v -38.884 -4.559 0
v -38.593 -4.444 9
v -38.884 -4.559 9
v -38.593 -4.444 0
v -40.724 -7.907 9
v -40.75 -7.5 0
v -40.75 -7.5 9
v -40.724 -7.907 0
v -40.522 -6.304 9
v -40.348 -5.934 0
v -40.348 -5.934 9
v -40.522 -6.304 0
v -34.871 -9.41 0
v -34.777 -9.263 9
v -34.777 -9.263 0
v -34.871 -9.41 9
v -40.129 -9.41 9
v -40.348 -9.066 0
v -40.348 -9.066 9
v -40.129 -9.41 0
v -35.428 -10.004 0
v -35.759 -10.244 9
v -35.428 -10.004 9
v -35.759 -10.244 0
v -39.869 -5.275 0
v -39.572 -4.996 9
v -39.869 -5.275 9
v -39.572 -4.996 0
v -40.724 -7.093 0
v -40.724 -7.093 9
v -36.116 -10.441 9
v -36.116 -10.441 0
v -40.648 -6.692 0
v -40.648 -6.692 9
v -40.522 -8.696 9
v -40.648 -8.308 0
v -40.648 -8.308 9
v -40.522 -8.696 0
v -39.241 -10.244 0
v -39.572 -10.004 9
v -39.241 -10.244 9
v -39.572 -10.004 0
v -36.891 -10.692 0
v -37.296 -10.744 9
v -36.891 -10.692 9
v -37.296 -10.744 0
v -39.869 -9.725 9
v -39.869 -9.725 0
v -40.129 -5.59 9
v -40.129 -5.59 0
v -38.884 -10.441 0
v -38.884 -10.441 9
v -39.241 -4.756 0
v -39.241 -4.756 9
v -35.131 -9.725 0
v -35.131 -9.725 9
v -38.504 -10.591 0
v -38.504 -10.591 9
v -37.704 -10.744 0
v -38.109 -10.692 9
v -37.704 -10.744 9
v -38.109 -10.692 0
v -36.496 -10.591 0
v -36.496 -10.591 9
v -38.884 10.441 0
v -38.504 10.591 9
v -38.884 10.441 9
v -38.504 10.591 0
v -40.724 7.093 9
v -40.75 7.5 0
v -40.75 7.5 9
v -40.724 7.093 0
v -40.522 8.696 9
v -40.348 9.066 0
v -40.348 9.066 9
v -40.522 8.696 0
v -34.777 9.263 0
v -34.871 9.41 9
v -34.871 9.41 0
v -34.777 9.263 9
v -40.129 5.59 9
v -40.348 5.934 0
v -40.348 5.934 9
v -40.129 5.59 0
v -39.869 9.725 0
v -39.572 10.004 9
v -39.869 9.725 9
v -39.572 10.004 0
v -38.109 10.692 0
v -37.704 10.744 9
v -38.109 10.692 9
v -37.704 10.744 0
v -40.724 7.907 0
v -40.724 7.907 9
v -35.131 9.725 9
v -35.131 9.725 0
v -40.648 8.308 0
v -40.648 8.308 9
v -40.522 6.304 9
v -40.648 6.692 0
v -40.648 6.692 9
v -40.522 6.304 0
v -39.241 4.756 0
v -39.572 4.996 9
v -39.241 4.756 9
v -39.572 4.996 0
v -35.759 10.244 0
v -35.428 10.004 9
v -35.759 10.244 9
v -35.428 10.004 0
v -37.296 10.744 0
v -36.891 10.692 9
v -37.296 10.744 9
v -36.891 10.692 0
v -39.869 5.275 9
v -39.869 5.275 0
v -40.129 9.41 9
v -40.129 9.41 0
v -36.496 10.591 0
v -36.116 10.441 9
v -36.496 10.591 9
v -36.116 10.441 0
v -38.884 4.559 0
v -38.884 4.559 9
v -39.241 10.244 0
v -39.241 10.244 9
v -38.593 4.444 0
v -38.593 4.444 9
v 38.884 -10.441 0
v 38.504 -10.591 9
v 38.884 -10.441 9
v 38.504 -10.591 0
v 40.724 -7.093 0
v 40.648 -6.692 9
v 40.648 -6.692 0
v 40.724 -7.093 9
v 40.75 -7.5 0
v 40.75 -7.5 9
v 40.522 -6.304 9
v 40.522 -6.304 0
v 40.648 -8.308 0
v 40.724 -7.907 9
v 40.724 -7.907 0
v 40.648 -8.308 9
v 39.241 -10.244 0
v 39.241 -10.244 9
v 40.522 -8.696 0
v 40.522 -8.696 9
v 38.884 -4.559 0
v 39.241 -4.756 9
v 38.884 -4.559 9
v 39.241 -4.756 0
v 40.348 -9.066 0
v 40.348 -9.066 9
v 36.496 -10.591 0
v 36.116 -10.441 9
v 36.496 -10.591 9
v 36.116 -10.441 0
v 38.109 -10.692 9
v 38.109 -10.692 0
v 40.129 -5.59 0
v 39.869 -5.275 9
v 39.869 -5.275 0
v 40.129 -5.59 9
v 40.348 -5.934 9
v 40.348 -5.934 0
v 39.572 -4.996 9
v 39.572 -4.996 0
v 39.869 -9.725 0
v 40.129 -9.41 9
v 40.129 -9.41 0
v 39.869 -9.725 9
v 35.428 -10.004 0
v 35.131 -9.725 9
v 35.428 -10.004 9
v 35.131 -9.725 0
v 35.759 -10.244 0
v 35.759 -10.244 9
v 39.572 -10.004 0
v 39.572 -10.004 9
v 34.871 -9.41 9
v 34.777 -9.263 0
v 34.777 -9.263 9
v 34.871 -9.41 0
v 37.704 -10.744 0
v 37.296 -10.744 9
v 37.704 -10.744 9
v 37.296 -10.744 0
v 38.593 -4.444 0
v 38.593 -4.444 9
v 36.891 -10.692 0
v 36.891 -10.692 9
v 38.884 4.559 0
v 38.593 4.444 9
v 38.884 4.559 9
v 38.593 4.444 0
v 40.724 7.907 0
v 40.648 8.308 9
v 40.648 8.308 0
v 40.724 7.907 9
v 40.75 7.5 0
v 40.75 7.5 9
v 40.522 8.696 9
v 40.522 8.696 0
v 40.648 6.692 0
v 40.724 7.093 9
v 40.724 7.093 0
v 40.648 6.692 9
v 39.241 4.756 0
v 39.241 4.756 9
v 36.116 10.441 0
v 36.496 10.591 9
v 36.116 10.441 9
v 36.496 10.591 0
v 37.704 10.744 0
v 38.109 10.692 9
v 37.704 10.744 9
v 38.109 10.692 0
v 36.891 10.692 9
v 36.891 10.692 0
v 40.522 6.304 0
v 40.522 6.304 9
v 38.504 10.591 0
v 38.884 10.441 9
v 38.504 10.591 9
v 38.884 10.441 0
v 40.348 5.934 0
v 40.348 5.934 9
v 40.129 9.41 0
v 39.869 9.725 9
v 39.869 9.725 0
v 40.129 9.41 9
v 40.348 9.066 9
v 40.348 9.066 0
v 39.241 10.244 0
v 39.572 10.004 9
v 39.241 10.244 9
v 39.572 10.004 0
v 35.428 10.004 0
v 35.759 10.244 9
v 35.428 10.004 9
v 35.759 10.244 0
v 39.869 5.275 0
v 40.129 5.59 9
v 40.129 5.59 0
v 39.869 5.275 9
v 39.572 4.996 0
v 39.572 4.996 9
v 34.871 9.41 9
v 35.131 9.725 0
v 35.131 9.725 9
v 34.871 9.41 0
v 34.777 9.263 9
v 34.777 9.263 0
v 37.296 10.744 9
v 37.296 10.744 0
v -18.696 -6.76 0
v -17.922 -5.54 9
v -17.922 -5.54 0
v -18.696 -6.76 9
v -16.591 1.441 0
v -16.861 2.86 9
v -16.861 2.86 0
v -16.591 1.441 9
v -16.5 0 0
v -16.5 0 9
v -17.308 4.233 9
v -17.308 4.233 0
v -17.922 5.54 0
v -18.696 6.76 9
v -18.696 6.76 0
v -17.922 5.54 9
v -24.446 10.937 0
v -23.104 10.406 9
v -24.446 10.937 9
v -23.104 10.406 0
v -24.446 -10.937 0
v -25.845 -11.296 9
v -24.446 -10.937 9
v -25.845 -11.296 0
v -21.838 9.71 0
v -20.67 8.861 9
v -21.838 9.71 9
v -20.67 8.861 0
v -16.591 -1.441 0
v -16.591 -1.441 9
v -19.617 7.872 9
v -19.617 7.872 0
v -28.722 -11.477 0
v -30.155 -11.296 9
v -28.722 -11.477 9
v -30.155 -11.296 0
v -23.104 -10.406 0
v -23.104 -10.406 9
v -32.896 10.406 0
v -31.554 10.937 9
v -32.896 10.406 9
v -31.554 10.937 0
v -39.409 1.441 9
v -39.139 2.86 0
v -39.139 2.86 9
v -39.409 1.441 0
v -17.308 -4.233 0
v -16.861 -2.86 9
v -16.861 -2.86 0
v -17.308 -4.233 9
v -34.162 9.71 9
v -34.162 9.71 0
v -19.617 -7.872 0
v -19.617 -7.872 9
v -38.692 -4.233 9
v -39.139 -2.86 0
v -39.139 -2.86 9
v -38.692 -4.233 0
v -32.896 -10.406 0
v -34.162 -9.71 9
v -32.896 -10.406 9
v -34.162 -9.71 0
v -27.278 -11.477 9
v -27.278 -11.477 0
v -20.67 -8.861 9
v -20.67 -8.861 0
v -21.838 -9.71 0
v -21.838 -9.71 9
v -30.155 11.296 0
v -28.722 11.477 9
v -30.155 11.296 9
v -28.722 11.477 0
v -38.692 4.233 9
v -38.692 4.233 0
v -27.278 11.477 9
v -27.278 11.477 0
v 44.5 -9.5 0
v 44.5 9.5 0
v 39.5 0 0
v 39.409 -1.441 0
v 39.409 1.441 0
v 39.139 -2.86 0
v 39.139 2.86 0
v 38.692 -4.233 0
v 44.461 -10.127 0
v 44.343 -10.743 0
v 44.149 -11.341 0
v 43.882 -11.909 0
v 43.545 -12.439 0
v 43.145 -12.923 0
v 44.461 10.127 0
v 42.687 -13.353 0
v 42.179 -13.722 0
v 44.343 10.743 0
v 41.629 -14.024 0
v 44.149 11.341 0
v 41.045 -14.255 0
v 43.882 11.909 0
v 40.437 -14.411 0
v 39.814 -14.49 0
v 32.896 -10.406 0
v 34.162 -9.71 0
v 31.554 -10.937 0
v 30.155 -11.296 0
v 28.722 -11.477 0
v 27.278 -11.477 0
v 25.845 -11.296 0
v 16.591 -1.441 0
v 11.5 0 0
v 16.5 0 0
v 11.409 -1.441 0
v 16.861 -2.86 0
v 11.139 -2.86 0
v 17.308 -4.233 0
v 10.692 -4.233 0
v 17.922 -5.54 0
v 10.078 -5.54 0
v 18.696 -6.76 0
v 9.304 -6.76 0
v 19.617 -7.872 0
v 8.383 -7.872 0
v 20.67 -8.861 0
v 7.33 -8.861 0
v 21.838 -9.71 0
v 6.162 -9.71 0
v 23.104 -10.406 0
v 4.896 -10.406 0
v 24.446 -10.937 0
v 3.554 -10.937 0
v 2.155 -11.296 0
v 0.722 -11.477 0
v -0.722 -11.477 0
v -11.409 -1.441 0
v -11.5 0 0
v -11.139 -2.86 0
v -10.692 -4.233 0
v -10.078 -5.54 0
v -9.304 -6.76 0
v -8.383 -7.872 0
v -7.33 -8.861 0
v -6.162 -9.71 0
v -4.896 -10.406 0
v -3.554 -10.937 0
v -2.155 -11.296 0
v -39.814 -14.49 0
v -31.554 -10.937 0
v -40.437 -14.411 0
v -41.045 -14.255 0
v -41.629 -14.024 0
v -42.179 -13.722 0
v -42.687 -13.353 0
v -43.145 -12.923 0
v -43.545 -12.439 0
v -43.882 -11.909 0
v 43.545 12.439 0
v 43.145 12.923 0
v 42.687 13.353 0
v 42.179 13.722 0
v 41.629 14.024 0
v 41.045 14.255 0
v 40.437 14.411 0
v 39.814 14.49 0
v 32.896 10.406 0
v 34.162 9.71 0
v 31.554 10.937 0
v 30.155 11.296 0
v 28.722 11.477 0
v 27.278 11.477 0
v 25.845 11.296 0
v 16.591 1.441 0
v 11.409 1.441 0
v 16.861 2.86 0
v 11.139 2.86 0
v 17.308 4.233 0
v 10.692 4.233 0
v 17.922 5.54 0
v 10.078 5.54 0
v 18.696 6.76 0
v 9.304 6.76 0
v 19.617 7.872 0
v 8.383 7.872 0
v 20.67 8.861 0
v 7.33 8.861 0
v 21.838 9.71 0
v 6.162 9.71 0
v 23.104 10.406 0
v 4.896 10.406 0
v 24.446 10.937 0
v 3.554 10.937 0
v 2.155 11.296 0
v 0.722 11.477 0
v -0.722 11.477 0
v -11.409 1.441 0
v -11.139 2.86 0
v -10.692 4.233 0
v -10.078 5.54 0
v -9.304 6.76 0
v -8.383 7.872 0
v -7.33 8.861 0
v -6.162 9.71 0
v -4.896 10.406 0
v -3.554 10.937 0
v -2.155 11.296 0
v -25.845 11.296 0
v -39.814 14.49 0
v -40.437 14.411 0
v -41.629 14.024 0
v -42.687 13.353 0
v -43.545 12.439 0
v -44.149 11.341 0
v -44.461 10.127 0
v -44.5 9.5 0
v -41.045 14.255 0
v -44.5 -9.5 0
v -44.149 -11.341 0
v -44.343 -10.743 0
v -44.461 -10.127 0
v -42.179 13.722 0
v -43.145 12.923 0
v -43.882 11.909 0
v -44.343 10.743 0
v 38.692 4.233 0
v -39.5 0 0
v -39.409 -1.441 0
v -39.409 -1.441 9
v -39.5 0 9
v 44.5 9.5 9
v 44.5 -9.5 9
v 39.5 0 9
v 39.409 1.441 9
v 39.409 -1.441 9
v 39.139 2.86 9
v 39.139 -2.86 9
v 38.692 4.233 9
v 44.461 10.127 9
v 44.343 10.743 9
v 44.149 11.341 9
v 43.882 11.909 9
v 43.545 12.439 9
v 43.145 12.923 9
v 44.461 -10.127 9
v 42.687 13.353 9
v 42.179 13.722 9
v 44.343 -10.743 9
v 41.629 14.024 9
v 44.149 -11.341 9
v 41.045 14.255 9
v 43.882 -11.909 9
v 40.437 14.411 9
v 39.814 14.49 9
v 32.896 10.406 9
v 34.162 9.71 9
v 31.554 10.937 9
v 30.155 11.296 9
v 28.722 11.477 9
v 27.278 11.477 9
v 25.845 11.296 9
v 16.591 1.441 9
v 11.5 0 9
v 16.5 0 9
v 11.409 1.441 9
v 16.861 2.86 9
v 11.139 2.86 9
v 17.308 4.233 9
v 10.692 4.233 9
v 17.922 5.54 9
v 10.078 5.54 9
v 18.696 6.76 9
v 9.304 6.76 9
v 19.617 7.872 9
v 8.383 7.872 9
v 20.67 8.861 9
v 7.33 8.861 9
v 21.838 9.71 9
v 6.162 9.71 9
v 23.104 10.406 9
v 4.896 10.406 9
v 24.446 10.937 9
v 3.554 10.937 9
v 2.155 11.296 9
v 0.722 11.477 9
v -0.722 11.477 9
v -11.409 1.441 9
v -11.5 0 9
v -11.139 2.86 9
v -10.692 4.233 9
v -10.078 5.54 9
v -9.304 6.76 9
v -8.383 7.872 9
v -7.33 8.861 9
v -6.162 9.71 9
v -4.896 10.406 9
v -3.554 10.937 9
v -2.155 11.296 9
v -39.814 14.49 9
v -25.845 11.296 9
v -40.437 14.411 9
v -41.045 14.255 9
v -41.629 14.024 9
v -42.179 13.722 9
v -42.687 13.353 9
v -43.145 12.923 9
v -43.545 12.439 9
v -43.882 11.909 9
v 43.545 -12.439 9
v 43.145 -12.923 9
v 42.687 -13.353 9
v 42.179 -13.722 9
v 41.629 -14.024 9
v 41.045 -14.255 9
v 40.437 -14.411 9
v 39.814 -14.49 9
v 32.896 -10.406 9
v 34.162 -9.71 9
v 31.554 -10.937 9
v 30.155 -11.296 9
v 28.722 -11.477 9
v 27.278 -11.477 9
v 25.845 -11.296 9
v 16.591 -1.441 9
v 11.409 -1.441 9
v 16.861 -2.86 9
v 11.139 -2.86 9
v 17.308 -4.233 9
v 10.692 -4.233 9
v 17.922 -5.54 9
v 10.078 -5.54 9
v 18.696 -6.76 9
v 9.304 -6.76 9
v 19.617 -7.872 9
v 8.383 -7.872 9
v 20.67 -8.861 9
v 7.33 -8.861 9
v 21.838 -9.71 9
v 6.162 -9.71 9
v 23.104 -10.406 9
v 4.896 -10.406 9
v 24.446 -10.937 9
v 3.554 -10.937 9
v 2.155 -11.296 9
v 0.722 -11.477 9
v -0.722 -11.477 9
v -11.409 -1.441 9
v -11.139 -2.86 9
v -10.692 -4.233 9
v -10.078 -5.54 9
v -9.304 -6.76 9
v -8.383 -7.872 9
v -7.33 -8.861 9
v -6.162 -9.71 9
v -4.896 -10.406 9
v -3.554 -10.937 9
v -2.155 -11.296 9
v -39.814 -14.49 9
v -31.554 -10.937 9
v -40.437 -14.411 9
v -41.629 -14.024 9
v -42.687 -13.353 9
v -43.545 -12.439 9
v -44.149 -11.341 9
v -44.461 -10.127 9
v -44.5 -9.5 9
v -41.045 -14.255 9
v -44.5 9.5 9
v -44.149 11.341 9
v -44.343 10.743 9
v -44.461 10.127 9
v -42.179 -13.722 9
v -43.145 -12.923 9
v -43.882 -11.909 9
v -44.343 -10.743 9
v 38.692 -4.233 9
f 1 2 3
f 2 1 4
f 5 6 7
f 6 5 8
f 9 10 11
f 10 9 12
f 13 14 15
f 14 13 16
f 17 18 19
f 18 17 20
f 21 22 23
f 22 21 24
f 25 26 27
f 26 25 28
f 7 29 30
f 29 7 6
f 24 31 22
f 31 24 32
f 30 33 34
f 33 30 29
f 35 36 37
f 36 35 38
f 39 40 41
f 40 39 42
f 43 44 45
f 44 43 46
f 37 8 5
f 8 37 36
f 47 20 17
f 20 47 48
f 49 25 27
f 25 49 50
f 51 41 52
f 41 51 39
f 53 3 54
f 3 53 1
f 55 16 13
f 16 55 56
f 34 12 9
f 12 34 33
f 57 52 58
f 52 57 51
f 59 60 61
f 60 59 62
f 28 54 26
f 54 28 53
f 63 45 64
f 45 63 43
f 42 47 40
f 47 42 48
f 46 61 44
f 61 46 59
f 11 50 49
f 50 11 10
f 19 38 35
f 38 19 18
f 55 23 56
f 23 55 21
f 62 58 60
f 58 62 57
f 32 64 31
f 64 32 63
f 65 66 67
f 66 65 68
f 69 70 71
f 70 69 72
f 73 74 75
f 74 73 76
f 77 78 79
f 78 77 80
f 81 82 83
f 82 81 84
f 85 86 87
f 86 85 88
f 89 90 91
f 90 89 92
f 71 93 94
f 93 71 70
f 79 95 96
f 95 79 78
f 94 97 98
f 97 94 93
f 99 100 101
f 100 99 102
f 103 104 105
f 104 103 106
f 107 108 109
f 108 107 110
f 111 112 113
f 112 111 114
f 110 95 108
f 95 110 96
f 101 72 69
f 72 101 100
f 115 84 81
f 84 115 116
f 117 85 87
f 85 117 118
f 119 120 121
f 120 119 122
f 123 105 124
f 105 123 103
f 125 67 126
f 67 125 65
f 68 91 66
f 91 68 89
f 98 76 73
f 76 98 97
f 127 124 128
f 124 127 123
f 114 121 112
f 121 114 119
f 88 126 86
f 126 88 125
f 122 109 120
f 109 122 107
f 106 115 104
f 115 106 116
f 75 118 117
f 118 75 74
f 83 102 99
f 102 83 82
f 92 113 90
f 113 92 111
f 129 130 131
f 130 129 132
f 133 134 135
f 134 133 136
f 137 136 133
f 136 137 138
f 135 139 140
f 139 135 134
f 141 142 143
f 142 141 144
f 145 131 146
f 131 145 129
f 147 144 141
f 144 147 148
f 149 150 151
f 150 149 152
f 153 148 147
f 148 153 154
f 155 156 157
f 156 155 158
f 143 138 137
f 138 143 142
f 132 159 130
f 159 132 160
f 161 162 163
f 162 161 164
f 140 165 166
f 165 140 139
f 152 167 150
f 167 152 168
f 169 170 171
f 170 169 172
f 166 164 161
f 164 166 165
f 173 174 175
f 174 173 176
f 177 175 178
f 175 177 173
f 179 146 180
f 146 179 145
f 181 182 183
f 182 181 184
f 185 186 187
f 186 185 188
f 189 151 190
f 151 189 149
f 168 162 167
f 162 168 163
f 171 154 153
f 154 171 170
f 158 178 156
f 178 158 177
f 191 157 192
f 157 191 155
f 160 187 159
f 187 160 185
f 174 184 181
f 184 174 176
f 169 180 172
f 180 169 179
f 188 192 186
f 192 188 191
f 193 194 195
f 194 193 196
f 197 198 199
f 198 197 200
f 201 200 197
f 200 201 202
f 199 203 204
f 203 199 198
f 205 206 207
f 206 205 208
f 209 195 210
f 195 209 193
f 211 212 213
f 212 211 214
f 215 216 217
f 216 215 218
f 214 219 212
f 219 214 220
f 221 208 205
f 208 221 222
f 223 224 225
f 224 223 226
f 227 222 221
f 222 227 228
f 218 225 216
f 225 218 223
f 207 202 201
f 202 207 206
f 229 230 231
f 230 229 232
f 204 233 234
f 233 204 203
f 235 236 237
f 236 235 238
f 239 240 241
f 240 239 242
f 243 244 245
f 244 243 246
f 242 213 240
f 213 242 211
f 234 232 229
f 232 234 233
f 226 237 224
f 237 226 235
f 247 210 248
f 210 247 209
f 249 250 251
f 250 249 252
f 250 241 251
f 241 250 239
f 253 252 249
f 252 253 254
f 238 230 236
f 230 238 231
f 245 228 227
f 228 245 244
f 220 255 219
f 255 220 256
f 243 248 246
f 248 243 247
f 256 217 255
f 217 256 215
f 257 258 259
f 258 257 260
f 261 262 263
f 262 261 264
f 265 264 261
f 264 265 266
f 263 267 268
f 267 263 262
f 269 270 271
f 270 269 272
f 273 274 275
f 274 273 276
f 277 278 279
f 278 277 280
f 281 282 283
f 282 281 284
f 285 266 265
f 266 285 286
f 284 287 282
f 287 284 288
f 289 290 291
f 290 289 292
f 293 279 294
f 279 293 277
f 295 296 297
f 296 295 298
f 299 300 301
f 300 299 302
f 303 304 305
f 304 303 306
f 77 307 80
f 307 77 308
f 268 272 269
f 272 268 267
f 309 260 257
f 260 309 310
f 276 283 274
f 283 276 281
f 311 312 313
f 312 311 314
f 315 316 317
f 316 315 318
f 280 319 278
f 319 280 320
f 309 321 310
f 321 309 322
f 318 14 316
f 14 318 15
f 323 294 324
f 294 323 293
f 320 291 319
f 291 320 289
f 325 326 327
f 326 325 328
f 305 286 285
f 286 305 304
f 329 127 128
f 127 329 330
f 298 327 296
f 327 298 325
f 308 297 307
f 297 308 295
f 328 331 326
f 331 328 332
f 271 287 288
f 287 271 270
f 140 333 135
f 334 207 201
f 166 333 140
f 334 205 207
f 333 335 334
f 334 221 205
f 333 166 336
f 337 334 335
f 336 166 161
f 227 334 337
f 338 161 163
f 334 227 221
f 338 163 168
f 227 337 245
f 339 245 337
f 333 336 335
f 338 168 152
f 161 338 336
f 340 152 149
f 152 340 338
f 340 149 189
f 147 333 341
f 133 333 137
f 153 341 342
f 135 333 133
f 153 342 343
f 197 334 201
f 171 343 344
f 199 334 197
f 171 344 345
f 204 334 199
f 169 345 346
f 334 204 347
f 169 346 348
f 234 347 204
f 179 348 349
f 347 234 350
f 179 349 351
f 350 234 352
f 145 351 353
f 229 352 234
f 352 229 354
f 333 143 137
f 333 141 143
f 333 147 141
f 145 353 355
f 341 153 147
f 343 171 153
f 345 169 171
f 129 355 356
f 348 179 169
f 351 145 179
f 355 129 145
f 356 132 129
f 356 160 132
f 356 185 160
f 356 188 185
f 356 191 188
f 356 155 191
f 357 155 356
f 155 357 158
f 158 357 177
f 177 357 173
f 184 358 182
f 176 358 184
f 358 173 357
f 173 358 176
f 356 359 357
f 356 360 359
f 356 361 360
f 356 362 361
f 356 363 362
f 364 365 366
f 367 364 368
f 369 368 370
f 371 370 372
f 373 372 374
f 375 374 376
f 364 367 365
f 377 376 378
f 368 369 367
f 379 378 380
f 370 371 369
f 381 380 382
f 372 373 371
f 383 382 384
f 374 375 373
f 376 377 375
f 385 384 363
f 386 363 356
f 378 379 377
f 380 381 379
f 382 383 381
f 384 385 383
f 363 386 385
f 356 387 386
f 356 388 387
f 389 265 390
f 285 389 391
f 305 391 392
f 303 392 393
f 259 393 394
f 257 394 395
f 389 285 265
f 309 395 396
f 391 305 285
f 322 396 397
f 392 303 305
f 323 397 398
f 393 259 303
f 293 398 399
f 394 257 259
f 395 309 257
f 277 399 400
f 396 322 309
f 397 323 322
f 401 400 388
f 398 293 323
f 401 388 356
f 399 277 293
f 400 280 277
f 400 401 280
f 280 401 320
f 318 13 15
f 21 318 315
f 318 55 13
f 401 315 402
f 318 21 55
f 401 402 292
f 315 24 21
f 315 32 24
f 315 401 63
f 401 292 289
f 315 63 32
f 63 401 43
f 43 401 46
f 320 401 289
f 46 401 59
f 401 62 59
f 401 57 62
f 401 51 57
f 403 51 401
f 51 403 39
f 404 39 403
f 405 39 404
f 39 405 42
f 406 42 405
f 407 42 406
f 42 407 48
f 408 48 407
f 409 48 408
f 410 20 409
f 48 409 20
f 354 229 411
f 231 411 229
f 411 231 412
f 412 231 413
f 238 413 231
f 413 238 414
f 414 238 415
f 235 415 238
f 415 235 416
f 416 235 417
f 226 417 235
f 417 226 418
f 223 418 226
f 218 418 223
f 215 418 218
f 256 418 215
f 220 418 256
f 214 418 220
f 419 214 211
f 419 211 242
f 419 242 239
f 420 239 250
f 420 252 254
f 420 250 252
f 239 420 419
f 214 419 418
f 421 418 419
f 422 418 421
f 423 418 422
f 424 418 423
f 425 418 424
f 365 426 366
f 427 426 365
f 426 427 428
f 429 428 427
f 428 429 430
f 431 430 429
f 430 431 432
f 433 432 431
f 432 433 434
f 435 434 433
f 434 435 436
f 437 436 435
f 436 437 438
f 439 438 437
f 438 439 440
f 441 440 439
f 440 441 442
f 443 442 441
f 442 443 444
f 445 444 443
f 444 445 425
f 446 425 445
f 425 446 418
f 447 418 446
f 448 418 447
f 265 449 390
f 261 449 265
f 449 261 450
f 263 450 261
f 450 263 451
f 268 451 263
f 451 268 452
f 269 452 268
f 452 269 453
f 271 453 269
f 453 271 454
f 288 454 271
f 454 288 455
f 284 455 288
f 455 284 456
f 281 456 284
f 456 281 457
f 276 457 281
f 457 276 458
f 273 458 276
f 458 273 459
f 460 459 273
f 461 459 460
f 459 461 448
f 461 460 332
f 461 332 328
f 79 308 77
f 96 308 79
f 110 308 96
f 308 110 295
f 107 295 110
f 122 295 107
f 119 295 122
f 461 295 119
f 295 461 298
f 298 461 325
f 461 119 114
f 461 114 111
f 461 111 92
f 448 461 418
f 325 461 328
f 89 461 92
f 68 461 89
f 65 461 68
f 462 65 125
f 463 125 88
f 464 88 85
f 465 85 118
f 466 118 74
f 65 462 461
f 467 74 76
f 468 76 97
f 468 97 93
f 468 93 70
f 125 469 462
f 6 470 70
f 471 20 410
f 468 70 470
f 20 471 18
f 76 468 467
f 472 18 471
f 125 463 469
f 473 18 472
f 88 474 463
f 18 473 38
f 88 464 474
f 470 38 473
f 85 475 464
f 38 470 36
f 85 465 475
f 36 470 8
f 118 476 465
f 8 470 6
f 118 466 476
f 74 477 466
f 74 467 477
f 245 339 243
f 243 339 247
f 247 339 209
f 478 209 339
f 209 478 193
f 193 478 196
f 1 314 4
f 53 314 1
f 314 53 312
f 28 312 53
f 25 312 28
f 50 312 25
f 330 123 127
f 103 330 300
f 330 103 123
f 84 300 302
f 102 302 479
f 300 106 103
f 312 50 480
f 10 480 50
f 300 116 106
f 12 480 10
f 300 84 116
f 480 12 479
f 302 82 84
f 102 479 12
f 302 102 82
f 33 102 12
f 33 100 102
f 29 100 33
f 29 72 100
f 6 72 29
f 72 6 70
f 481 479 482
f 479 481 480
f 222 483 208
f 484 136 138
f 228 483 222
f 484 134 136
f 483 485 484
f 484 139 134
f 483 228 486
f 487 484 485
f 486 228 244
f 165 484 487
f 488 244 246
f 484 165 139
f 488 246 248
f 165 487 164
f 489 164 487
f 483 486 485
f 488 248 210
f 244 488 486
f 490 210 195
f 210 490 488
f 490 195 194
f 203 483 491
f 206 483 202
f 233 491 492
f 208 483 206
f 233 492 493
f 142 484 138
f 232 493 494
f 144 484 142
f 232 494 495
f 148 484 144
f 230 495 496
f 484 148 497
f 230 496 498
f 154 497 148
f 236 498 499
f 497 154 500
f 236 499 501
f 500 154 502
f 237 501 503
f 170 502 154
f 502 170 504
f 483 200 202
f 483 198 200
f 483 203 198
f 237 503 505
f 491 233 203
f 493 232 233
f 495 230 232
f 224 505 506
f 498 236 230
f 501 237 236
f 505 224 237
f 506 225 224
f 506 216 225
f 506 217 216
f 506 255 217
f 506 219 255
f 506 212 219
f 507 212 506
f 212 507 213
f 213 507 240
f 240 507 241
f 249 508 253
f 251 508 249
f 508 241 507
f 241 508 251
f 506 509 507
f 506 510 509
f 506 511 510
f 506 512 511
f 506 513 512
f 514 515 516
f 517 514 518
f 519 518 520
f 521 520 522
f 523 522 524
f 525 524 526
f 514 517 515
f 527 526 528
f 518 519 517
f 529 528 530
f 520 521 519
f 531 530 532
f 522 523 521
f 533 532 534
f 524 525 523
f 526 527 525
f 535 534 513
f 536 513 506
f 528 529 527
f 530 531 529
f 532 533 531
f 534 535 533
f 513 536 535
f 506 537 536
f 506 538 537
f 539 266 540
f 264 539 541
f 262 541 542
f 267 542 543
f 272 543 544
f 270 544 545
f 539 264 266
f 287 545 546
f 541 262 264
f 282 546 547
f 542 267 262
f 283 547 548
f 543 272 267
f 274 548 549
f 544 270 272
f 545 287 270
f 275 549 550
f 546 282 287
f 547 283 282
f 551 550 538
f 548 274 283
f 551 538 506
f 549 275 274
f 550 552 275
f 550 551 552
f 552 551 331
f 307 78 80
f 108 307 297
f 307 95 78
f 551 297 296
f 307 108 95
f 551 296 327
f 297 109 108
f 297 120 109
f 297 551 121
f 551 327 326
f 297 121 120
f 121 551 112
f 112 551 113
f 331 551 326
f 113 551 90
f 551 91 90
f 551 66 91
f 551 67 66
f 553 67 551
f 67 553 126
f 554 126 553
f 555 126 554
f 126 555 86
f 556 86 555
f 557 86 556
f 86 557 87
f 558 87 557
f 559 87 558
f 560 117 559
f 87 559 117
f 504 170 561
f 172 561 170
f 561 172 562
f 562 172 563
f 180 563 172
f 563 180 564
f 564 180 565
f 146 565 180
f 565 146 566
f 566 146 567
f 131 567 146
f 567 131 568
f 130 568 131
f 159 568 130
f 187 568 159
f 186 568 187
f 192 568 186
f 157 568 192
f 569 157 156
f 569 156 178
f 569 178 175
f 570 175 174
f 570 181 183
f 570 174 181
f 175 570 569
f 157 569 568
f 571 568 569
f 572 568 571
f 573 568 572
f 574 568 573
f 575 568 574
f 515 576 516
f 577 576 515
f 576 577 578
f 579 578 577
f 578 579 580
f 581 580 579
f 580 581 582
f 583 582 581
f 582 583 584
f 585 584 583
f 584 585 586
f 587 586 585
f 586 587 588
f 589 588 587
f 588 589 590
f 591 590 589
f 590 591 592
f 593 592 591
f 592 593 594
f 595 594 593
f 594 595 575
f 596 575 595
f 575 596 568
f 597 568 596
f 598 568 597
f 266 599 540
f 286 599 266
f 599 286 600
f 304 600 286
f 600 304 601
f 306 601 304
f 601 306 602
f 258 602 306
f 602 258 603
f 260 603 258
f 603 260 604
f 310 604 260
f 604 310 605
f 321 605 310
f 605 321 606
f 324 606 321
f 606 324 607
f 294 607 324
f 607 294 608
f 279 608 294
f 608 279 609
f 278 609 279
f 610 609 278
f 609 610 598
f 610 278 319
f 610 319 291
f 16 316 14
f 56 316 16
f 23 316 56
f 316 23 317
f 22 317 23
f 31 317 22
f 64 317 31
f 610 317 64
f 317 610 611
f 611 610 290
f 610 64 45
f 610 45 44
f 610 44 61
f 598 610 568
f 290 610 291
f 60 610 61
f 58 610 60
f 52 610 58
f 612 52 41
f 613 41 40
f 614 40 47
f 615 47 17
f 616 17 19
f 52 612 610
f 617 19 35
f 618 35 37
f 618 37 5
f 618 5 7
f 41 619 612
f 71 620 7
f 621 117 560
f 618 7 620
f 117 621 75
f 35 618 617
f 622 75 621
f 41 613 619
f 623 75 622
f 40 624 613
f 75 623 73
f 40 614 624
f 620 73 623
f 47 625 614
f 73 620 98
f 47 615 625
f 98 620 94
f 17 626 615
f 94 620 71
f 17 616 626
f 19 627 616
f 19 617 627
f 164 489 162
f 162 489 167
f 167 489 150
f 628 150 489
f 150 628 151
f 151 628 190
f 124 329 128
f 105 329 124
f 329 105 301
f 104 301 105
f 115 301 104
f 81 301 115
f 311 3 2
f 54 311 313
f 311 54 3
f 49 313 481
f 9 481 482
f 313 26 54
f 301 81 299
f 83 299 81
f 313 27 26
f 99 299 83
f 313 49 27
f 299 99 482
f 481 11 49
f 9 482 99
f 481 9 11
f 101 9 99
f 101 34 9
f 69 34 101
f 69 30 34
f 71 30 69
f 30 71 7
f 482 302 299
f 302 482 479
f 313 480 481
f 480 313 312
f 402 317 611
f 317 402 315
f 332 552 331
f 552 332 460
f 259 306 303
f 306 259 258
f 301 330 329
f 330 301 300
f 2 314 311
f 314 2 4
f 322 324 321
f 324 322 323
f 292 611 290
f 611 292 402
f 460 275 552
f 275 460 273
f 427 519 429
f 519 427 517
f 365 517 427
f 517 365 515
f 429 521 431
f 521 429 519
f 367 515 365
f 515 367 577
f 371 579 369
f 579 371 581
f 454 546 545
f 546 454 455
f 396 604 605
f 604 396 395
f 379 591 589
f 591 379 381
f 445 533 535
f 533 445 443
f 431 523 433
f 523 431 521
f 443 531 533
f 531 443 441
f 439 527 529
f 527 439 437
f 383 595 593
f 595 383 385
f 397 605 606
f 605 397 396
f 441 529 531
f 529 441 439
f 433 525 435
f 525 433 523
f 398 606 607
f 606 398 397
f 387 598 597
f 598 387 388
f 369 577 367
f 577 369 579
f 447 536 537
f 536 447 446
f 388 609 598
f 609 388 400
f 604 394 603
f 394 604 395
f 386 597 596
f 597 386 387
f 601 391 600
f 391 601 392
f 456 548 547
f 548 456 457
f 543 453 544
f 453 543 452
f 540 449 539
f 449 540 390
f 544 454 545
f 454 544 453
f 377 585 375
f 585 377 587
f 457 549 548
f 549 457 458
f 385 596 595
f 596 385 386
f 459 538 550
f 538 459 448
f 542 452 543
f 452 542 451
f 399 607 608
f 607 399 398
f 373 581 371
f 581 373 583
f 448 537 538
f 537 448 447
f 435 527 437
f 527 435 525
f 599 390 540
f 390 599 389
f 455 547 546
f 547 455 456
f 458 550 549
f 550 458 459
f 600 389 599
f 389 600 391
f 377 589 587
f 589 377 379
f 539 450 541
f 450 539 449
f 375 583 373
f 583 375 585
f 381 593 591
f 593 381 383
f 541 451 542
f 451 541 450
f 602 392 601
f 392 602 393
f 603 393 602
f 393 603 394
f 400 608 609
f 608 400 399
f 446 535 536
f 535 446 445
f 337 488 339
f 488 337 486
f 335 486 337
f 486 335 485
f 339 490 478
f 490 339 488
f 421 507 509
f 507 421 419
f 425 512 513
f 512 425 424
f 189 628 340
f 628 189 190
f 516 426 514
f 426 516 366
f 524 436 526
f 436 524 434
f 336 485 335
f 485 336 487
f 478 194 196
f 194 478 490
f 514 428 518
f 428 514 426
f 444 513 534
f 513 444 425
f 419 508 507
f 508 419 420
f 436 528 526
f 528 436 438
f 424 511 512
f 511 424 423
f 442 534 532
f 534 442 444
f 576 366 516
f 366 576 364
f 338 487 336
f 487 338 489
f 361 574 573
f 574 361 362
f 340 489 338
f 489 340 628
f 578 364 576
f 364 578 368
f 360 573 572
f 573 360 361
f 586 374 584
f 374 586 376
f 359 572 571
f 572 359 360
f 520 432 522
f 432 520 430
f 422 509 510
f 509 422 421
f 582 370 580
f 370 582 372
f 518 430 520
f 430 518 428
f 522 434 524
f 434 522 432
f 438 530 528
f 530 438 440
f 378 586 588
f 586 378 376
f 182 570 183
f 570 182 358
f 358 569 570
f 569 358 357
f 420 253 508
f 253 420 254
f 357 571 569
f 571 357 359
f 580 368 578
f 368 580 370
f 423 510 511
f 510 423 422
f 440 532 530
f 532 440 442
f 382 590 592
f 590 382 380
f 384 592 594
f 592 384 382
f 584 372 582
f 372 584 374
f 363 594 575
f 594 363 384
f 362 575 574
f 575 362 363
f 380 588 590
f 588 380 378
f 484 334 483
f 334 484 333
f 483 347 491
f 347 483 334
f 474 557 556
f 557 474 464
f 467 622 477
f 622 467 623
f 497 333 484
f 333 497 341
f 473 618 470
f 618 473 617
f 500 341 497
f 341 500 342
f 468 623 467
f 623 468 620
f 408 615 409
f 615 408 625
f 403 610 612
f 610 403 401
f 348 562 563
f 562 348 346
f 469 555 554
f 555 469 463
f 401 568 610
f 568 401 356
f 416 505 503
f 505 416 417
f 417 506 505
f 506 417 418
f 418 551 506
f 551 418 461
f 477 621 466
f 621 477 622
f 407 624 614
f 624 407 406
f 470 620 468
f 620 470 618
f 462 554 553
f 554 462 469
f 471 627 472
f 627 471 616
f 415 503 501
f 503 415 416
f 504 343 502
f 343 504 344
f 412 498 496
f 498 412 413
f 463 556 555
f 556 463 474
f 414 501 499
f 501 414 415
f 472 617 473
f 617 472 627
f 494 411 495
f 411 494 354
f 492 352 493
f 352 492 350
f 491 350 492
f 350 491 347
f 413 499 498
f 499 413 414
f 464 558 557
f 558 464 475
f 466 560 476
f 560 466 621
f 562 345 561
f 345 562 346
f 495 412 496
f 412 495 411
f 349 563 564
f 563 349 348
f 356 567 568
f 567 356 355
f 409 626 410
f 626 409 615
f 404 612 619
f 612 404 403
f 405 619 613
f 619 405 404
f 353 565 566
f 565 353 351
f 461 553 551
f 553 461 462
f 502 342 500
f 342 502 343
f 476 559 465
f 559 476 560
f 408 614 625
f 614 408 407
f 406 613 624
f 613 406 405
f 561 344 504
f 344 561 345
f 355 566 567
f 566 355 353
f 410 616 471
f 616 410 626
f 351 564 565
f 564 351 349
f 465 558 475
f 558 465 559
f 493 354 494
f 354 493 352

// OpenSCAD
$fn = 50;

difference() {
	union() {
		hull() {
			translate(v = [-39.5, 9.5, 0]) {
				cylinder(h = 9, r = 5);
			}
			translate(v = [39.5, 9.5, 0]) {
				cylinder(h = 9, r = 5);
			}
			translate(v = [-39.5, -9.5, 0]) {
				cylinder(h = 9, r = 5);
			}
			translate(v = [39.5, -9.5, 0]) {
				cylinder(h = 9, r = 5);
			}
		}
	}
	union() {
		translate(v = [-37.5, -7.5, -100.0]) {
			cylinder(h = 200, r = 3.25);
		}
		translate(v = [-37.5, 7.5, -100.0]) {
			cylinder(h = 200, r = 3.25);
		}
		translate(v = [37.5, -7.5, -100.0]) {
			cylinder(h = 200, r = 3.25);
		}
		translate(v = [37.5, 7.5, -100.0]) {
			cylinder(h = 200, r = 3.25);
		}
		translate(v = [-37.5, -7.5, -100.0]) {
			cylinder(h = 200, r = 1.8);
		}
		translate(v = [-37.5, 7.5, -100.0]) {
			cylinder(h = 200, r = 1.8);
		}
		translate(v = [37.5, -7.5, -100.0]) {
			cylinder(h = 200, r = 1.8);
		}
		translate(v = [37.5, 7.5, -100.0]) {
			cylinder(h = 200, r = 1.8);
		}
		translate(v = [-28.0, 0, 0.0]) {
			cylinder(h = 9, r = 11.5);
		}
		cylinder(h = 9, r = 11.5);
		translate(v = [28.0, 0, 0.0]) {
			cylinder(h = 9, r = 11.5);
		}
	}
}
